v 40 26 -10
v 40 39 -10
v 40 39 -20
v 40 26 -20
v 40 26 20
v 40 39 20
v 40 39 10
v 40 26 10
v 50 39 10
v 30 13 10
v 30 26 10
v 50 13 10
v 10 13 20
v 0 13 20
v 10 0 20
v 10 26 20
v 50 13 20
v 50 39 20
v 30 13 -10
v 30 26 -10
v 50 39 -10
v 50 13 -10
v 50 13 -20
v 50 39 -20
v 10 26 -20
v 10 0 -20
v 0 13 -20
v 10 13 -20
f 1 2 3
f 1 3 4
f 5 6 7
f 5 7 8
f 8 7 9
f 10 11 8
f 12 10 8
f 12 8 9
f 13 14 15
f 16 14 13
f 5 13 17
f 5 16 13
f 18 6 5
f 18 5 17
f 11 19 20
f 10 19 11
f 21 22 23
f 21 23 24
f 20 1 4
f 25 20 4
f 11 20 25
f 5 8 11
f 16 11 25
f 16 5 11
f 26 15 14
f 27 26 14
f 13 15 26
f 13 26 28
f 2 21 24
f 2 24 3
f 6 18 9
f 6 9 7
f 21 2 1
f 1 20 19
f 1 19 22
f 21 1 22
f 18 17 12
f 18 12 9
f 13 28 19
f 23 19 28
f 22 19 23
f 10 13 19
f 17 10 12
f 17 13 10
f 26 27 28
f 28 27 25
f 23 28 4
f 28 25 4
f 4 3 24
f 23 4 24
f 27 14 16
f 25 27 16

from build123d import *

# Parameters (mm, degrees)
F1_DEPTH = 20
F2_W     = 20
F2_H     = 20
F3_DEPTH = 26.001
F5_DEPTH = 40.001
F7_DEPTH = 40.001


with BuildPart() as f1:
    # F0 (on Top) → F1 (new body, symmetric)
    with BuildSketch(Plane.XY):
        Polygon((0, 26), (0, 0), (10, 0), (10, 13), (50, 13), (50, 39), (40, 39), (40, 26), align=None)
    extrude(amount=F1_DEPTH, both=True)

    # F2 (on face) → F3 (cut, through all)
    with BuildSketch(Plane.XZ.offset(-13)):
        with Locations((40, 0)):
            Rectangle(F2_W, F2_H)
    extrude(amount=-F3_DEPTH, mode=Mode.SUBTRACT)

    # F4 (on face) → F5 (cut, through all)
    with BuildSketch(Plane.XY.offset(20)):
        Polygon((0, 0), (10, 0), (0, 13), align=None)
    extrude(amount=-F5_DEPTH, mode=Mode.SUBTRACT)

    # F6 (on face) → F7 (cut, through all)
    with BuildSketch(Plane.XY.offset(20)):
        Polygon((0, 13), (10, 26), (0, 26), align=None)
    extrude(amount=-F7_DEPTH, mode=Mode.SUBTRACT)


solid = f1.part
